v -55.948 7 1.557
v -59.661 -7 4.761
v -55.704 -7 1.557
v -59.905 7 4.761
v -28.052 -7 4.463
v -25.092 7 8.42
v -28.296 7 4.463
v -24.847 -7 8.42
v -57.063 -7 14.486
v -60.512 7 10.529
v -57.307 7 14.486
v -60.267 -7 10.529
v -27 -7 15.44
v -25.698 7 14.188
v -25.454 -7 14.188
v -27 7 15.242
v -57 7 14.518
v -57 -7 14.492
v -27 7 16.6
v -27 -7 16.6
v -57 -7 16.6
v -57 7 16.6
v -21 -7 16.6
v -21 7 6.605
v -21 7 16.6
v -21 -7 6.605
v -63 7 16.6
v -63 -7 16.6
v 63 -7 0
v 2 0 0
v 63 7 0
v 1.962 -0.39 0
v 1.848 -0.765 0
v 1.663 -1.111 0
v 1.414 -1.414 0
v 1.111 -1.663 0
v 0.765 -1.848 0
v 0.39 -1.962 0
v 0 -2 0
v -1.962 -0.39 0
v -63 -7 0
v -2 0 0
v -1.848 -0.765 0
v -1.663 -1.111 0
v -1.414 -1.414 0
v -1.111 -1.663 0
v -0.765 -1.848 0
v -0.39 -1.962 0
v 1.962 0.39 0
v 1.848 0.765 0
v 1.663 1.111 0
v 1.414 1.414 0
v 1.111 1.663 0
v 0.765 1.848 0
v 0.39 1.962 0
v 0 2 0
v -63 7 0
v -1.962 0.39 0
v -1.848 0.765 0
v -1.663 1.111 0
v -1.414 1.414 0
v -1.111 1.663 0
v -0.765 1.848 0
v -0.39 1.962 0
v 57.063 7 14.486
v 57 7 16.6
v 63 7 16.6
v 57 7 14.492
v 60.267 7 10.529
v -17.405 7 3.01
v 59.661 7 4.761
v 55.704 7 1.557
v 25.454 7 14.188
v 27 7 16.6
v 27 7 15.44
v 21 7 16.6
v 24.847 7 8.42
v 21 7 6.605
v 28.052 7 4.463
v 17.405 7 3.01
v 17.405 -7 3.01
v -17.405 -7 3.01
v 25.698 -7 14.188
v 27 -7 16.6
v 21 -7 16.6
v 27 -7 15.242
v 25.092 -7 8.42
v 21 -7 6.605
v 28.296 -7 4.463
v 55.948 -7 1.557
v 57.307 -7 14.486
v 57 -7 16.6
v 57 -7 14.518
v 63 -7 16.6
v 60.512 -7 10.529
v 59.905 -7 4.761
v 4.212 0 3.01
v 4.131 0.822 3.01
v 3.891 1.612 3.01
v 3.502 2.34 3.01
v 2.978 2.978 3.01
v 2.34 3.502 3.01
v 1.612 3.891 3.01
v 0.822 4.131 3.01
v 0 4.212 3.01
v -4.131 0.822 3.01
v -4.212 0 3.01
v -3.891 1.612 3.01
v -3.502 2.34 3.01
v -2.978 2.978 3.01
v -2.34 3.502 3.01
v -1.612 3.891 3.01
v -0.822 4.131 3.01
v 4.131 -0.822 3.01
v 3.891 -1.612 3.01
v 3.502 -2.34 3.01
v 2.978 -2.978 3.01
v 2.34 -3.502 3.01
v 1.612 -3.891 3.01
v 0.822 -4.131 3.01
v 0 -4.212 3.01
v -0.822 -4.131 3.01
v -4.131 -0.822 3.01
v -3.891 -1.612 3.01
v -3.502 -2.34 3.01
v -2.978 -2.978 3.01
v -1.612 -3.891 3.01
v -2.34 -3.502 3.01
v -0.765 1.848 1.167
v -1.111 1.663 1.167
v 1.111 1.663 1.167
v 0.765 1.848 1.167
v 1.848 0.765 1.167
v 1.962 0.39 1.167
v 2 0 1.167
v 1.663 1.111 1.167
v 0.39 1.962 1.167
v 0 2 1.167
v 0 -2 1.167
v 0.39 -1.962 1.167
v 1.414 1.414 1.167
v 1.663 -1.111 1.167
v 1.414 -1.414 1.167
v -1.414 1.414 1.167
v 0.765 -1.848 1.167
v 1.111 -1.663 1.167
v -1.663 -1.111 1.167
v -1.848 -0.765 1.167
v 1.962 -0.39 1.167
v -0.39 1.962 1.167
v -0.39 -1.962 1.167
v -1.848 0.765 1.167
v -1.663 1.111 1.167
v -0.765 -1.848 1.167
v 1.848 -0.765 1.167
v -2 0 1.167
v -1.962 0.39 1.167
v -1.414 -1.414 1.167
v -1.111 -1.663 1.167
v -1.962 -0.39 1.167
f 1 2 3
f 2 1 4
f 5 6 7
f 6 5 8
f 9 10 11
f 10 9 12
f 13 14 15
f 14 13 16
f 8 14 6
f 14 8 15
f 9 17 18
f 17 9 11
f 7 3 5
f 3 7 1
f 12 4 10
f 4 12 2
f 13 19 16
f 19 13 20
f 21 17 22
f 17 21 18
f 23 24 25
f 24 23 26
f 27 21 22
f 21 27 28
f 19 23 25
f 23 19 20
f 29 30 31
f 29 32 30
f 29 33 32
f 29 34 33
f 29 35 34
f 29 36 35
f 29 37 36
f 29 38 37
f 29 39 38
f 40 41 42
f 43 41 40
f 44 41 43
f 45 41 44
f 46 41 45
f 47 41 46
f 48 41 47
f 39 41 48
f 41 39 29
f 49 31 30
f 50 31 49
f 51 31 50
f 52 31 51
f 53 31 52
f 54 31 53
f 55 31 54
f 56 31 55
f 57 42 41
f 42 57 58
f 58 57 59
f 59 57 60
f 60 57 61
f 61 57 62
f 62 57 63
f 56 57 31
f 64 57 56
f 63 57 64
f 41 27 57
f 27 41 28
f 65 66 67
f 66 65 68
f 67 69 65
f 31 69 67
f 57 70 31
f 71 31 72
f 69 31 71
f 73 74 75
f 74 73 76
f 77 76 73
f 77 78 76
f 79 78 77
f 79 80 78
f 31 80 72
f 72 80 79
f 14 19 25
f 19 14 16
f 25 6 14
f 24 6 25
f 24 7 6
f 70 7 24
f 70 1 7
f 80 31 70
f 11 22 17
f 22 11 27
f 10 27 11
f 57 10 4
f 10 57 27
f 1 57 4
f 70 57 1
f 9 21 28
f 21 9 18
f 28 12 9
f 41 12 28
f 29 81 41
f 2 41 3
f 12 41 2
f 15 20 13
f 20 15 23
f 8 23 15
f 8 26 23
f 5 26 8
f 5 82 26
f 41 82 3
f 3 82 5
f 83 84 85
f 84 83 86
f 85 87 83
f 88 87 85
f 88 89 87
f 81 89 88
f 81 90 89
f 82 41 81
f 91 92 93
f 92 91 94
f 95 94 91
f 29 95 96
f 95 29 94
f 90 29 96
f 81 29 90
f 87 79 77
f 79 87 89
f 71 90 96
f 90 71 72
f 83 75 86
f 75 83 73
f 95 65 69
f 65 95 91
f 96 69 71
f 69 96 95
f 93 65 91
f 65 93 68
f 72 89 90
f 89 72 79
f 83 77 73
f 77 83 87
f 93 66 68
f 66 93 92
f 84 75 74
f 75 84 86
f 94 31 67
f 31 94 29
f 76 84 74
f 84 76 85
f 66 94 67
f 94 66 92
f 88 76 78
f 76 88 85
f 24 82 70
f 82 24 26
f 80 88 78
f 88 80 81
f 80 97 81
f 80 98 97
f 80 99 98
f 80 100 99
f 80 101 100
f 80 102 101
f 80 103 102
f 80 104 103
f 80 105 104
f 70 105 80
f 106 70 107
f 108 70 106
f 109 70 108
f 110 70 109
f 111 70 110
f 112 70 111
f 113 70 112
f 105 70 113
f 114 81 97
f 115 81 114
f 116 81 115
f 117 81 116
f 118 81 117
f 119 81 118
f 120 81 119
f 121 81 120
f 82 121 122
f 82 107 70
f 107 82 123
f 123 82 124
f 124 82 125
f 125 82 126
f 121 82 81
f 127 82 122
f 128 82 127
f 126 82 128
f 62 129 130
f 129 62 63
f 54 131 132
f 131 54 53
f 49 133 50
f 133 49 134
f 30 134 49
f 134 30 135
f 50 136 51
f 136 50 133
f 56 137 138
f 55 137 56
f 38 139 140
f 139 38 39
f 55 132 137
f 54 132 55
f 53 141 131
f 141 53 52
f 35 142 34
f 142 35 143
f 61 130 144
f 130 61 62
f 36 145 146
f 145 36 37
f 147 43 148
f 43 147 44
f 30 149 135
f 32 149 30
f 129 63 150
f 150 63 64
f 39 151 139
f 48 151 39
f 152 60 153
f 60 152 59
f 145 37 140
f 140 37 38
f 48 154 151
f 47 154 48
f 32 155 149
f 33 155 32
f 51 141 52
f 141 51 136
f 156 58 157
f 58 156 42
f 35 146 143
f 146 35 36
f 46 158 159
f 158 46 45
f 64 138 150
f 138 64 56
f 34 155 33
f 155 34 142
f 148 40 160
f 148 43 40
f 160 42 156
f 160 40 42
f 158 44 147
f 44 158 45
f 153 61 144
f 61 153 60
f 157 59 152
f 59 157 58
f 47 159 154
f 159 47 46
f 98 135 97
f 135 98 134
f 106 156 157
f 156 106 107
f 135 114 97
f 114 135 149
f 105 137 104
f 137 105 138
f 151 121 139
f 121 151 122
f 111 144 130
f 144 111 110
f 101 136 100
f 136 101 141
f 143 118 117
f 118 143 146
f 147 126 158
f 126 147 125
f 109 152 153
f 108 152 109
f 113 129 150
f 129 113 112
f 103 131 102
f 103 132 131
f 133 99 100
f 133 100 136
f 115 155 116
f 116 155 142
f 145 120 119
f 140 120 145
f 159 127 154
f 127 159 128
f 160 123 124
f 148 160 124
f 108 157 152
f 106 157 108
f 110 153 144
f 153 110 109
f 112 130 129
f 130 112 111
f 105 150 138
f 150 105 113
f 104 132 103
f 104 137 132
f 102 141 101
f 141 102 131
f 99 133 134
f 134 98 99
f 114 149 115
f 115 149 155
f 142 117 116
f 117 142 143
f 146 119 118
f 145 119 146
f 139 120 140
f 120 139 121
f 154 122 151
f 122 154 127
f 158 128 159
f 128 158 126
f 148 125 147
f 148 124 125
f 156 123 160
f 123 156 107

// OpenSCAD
$fn=32;

wall = 3;
inner_width = 35;
outer_width = inner_width + 2*wall+1;
total_len = 14;
base_height = wall;
inner_height = 13;
outer_height = inner_height+1.2*base_height;

/*
  ChamferZCube(w=1,h=10)

  A cube, which can be used to chamfer along the z axis

  Args:
    w: The width of the cube is sqrt(2)*w
    h: Height of the cube
    d: The cube has a descent below z=0 plane and an ascent beyond h by this value
  Notes:
    The cube is centered around z-axsis and placed on z=0 plane.

*/
module ChamferZCube(w=1,h=10, d=0) {
  translate([0,0,h/2])
  rotate([0,0,45])
  cube([sqrt(2)*w,sqrt(2)*w,h+2*d], center=true);
}

module ChamferXCube(w=1,h=10, d=0) {
  rotate([45,0,0])
  cube([h+2*d,sqrt(2)*w,sqrt(2)*w], center=true);
}

module ChamferYCube(w=1,h=10, d=0) {
  rotate([0,45,0])
  cube([sqrt(2)*w,h+2*d,sqrt(2)*w], center=true);
}


/*
  CenterCube(dim, ChamferBody = 0, ChamferBottom=0, ChamferTop=0)

  A cube which is centered along z axis but is placed on z=0 plane
  Optionally allows chamfer along z axis.

  Args:
    dim: Same as for cube(dim)
    ChamferBody: The amount to chamfer for edges parallel to z axis
    ChamferBottom: The amount to chamfer for edges in z=0 plane
    ChamferTop: The amount to chamfer for edges in z=dim[2] plane
  Example:
    CenterCube([10, 20, 5]);

    // create a rectangle bowl
    // thanks to chamfer no support is required with 3d print
    difference() {  
      wallthickness=2;
      xwidth = 10;
      ywidth = 20;
      height = 5;
      CenterCube( 
        [xwidth+2*wallthickness, ywidth+2*wallthickness, height], 
        ChamferBottom = wallthickness);
      translate([0,0,wallthickness])
      CenterCube([xwidth,ywidth,height]);
    }

*/

module CenterCube(dim, ChamferBody = 0, ChamferBottom=0, ChamferTop=0) {
  difference() {
    translate([0,0,dim[2]/2])
    cube(dim, center=true);

    if ( ChamferBody > 0 ) {
      translate([dim[0]/2,dim[1]/2,0])
      ChamferZCube(w=ChamferBody,h=dim[2],d=0.01);
      
      translate([-dim[0]/2,dim[1]/2,0])
      ChamferZCube(w=ChamferBody,h=dim[2],d=0.01);

      translate([-dim[0]/2,-dim[1]/2,0])
      ChamferZCube(w=ChamferBody,h=dim[2],d=0.01);

      translate([dim[0]/2,-dim[1]/2,0])
      ChamferZCube(w=ChamferBody,h=dim[2],d=0.01);
    }
    
    if ( ChamferBottom > 0 )
    {
      translate([-dim[0]/2,0,0])
      ChamferYCube(w=ChamferBottom,h=dim[1],d=0.01);

      translate([dim[0]/2,0,0])
      ChamferYCube(w=ChamferBottom,h=dim[1],d=0.01);

      translate([0,-dim[1]/2,0])
      ChamferXCube(w=ChamferBottom,h=dim[0],d=0.01);

      translate([0,dim[1]/2,0])
      ChamferXCube(w=ChamferBottom,h=dim[0],d=0.01);
    }
    
    if ( ChamferTop > 0 )
    {
      translate([-dim[0]/2,0,dim[2]])
      ChamferYCube(w=ChamferTop,h=dim[1],d=0.01);

      translate([dim[0]/2,0,dim[2]])
      ChamferYCube(w=ChamferTop,h=dim[1],d=0.01);

      translate([0,-dim[1]/2,dim[2]])
      ChamferXCube(w=ChamferTop,h=dim[0],d=0.01);

      translate([0,dim[1]/2,dim[2]])
      ChamferXCube(w=ChamferTop,h=dim[0],d=0.01);
    }
  }
}


module holder(is_screw_hole=true, is_holder=true, ry=0) {
  difference() {
    CenterCube([outer_width, total_len, outer_height]);
    if ( is_holder == true ) {
        translate([0,0,base_height+0.01])
        rotate([0,ry,1])
        CenterCube([inner_width, 2*total_len, inner_height],
            ChamferBottom=3.6, ChamferTop=3.6);
        translate([0,0,base_height+inner_height/2])
        CenterCube([inner_width-5, 2*total_len, inner_height]);
    }
    else {
        translate([0,0,base_height+0.01])
        CenterCube([outer_width+0.01, 2*total_len, inner_height*2],
            ChamferBottom=3.6);
    }

    if ( is_screw_hole == true ) {   
        cylinder(d=4,h=base_height*3, center=true);    
        translate([0,0,-0.5])
        cylinder(d1=0, d2=12, h=5);
    }
  }
}

translate([-outer_width, 0, 0])
holder(false, true, -6);
translate([outer_width, 0, 0])
holder(false, true, 6);
holder(true, false, 0);
